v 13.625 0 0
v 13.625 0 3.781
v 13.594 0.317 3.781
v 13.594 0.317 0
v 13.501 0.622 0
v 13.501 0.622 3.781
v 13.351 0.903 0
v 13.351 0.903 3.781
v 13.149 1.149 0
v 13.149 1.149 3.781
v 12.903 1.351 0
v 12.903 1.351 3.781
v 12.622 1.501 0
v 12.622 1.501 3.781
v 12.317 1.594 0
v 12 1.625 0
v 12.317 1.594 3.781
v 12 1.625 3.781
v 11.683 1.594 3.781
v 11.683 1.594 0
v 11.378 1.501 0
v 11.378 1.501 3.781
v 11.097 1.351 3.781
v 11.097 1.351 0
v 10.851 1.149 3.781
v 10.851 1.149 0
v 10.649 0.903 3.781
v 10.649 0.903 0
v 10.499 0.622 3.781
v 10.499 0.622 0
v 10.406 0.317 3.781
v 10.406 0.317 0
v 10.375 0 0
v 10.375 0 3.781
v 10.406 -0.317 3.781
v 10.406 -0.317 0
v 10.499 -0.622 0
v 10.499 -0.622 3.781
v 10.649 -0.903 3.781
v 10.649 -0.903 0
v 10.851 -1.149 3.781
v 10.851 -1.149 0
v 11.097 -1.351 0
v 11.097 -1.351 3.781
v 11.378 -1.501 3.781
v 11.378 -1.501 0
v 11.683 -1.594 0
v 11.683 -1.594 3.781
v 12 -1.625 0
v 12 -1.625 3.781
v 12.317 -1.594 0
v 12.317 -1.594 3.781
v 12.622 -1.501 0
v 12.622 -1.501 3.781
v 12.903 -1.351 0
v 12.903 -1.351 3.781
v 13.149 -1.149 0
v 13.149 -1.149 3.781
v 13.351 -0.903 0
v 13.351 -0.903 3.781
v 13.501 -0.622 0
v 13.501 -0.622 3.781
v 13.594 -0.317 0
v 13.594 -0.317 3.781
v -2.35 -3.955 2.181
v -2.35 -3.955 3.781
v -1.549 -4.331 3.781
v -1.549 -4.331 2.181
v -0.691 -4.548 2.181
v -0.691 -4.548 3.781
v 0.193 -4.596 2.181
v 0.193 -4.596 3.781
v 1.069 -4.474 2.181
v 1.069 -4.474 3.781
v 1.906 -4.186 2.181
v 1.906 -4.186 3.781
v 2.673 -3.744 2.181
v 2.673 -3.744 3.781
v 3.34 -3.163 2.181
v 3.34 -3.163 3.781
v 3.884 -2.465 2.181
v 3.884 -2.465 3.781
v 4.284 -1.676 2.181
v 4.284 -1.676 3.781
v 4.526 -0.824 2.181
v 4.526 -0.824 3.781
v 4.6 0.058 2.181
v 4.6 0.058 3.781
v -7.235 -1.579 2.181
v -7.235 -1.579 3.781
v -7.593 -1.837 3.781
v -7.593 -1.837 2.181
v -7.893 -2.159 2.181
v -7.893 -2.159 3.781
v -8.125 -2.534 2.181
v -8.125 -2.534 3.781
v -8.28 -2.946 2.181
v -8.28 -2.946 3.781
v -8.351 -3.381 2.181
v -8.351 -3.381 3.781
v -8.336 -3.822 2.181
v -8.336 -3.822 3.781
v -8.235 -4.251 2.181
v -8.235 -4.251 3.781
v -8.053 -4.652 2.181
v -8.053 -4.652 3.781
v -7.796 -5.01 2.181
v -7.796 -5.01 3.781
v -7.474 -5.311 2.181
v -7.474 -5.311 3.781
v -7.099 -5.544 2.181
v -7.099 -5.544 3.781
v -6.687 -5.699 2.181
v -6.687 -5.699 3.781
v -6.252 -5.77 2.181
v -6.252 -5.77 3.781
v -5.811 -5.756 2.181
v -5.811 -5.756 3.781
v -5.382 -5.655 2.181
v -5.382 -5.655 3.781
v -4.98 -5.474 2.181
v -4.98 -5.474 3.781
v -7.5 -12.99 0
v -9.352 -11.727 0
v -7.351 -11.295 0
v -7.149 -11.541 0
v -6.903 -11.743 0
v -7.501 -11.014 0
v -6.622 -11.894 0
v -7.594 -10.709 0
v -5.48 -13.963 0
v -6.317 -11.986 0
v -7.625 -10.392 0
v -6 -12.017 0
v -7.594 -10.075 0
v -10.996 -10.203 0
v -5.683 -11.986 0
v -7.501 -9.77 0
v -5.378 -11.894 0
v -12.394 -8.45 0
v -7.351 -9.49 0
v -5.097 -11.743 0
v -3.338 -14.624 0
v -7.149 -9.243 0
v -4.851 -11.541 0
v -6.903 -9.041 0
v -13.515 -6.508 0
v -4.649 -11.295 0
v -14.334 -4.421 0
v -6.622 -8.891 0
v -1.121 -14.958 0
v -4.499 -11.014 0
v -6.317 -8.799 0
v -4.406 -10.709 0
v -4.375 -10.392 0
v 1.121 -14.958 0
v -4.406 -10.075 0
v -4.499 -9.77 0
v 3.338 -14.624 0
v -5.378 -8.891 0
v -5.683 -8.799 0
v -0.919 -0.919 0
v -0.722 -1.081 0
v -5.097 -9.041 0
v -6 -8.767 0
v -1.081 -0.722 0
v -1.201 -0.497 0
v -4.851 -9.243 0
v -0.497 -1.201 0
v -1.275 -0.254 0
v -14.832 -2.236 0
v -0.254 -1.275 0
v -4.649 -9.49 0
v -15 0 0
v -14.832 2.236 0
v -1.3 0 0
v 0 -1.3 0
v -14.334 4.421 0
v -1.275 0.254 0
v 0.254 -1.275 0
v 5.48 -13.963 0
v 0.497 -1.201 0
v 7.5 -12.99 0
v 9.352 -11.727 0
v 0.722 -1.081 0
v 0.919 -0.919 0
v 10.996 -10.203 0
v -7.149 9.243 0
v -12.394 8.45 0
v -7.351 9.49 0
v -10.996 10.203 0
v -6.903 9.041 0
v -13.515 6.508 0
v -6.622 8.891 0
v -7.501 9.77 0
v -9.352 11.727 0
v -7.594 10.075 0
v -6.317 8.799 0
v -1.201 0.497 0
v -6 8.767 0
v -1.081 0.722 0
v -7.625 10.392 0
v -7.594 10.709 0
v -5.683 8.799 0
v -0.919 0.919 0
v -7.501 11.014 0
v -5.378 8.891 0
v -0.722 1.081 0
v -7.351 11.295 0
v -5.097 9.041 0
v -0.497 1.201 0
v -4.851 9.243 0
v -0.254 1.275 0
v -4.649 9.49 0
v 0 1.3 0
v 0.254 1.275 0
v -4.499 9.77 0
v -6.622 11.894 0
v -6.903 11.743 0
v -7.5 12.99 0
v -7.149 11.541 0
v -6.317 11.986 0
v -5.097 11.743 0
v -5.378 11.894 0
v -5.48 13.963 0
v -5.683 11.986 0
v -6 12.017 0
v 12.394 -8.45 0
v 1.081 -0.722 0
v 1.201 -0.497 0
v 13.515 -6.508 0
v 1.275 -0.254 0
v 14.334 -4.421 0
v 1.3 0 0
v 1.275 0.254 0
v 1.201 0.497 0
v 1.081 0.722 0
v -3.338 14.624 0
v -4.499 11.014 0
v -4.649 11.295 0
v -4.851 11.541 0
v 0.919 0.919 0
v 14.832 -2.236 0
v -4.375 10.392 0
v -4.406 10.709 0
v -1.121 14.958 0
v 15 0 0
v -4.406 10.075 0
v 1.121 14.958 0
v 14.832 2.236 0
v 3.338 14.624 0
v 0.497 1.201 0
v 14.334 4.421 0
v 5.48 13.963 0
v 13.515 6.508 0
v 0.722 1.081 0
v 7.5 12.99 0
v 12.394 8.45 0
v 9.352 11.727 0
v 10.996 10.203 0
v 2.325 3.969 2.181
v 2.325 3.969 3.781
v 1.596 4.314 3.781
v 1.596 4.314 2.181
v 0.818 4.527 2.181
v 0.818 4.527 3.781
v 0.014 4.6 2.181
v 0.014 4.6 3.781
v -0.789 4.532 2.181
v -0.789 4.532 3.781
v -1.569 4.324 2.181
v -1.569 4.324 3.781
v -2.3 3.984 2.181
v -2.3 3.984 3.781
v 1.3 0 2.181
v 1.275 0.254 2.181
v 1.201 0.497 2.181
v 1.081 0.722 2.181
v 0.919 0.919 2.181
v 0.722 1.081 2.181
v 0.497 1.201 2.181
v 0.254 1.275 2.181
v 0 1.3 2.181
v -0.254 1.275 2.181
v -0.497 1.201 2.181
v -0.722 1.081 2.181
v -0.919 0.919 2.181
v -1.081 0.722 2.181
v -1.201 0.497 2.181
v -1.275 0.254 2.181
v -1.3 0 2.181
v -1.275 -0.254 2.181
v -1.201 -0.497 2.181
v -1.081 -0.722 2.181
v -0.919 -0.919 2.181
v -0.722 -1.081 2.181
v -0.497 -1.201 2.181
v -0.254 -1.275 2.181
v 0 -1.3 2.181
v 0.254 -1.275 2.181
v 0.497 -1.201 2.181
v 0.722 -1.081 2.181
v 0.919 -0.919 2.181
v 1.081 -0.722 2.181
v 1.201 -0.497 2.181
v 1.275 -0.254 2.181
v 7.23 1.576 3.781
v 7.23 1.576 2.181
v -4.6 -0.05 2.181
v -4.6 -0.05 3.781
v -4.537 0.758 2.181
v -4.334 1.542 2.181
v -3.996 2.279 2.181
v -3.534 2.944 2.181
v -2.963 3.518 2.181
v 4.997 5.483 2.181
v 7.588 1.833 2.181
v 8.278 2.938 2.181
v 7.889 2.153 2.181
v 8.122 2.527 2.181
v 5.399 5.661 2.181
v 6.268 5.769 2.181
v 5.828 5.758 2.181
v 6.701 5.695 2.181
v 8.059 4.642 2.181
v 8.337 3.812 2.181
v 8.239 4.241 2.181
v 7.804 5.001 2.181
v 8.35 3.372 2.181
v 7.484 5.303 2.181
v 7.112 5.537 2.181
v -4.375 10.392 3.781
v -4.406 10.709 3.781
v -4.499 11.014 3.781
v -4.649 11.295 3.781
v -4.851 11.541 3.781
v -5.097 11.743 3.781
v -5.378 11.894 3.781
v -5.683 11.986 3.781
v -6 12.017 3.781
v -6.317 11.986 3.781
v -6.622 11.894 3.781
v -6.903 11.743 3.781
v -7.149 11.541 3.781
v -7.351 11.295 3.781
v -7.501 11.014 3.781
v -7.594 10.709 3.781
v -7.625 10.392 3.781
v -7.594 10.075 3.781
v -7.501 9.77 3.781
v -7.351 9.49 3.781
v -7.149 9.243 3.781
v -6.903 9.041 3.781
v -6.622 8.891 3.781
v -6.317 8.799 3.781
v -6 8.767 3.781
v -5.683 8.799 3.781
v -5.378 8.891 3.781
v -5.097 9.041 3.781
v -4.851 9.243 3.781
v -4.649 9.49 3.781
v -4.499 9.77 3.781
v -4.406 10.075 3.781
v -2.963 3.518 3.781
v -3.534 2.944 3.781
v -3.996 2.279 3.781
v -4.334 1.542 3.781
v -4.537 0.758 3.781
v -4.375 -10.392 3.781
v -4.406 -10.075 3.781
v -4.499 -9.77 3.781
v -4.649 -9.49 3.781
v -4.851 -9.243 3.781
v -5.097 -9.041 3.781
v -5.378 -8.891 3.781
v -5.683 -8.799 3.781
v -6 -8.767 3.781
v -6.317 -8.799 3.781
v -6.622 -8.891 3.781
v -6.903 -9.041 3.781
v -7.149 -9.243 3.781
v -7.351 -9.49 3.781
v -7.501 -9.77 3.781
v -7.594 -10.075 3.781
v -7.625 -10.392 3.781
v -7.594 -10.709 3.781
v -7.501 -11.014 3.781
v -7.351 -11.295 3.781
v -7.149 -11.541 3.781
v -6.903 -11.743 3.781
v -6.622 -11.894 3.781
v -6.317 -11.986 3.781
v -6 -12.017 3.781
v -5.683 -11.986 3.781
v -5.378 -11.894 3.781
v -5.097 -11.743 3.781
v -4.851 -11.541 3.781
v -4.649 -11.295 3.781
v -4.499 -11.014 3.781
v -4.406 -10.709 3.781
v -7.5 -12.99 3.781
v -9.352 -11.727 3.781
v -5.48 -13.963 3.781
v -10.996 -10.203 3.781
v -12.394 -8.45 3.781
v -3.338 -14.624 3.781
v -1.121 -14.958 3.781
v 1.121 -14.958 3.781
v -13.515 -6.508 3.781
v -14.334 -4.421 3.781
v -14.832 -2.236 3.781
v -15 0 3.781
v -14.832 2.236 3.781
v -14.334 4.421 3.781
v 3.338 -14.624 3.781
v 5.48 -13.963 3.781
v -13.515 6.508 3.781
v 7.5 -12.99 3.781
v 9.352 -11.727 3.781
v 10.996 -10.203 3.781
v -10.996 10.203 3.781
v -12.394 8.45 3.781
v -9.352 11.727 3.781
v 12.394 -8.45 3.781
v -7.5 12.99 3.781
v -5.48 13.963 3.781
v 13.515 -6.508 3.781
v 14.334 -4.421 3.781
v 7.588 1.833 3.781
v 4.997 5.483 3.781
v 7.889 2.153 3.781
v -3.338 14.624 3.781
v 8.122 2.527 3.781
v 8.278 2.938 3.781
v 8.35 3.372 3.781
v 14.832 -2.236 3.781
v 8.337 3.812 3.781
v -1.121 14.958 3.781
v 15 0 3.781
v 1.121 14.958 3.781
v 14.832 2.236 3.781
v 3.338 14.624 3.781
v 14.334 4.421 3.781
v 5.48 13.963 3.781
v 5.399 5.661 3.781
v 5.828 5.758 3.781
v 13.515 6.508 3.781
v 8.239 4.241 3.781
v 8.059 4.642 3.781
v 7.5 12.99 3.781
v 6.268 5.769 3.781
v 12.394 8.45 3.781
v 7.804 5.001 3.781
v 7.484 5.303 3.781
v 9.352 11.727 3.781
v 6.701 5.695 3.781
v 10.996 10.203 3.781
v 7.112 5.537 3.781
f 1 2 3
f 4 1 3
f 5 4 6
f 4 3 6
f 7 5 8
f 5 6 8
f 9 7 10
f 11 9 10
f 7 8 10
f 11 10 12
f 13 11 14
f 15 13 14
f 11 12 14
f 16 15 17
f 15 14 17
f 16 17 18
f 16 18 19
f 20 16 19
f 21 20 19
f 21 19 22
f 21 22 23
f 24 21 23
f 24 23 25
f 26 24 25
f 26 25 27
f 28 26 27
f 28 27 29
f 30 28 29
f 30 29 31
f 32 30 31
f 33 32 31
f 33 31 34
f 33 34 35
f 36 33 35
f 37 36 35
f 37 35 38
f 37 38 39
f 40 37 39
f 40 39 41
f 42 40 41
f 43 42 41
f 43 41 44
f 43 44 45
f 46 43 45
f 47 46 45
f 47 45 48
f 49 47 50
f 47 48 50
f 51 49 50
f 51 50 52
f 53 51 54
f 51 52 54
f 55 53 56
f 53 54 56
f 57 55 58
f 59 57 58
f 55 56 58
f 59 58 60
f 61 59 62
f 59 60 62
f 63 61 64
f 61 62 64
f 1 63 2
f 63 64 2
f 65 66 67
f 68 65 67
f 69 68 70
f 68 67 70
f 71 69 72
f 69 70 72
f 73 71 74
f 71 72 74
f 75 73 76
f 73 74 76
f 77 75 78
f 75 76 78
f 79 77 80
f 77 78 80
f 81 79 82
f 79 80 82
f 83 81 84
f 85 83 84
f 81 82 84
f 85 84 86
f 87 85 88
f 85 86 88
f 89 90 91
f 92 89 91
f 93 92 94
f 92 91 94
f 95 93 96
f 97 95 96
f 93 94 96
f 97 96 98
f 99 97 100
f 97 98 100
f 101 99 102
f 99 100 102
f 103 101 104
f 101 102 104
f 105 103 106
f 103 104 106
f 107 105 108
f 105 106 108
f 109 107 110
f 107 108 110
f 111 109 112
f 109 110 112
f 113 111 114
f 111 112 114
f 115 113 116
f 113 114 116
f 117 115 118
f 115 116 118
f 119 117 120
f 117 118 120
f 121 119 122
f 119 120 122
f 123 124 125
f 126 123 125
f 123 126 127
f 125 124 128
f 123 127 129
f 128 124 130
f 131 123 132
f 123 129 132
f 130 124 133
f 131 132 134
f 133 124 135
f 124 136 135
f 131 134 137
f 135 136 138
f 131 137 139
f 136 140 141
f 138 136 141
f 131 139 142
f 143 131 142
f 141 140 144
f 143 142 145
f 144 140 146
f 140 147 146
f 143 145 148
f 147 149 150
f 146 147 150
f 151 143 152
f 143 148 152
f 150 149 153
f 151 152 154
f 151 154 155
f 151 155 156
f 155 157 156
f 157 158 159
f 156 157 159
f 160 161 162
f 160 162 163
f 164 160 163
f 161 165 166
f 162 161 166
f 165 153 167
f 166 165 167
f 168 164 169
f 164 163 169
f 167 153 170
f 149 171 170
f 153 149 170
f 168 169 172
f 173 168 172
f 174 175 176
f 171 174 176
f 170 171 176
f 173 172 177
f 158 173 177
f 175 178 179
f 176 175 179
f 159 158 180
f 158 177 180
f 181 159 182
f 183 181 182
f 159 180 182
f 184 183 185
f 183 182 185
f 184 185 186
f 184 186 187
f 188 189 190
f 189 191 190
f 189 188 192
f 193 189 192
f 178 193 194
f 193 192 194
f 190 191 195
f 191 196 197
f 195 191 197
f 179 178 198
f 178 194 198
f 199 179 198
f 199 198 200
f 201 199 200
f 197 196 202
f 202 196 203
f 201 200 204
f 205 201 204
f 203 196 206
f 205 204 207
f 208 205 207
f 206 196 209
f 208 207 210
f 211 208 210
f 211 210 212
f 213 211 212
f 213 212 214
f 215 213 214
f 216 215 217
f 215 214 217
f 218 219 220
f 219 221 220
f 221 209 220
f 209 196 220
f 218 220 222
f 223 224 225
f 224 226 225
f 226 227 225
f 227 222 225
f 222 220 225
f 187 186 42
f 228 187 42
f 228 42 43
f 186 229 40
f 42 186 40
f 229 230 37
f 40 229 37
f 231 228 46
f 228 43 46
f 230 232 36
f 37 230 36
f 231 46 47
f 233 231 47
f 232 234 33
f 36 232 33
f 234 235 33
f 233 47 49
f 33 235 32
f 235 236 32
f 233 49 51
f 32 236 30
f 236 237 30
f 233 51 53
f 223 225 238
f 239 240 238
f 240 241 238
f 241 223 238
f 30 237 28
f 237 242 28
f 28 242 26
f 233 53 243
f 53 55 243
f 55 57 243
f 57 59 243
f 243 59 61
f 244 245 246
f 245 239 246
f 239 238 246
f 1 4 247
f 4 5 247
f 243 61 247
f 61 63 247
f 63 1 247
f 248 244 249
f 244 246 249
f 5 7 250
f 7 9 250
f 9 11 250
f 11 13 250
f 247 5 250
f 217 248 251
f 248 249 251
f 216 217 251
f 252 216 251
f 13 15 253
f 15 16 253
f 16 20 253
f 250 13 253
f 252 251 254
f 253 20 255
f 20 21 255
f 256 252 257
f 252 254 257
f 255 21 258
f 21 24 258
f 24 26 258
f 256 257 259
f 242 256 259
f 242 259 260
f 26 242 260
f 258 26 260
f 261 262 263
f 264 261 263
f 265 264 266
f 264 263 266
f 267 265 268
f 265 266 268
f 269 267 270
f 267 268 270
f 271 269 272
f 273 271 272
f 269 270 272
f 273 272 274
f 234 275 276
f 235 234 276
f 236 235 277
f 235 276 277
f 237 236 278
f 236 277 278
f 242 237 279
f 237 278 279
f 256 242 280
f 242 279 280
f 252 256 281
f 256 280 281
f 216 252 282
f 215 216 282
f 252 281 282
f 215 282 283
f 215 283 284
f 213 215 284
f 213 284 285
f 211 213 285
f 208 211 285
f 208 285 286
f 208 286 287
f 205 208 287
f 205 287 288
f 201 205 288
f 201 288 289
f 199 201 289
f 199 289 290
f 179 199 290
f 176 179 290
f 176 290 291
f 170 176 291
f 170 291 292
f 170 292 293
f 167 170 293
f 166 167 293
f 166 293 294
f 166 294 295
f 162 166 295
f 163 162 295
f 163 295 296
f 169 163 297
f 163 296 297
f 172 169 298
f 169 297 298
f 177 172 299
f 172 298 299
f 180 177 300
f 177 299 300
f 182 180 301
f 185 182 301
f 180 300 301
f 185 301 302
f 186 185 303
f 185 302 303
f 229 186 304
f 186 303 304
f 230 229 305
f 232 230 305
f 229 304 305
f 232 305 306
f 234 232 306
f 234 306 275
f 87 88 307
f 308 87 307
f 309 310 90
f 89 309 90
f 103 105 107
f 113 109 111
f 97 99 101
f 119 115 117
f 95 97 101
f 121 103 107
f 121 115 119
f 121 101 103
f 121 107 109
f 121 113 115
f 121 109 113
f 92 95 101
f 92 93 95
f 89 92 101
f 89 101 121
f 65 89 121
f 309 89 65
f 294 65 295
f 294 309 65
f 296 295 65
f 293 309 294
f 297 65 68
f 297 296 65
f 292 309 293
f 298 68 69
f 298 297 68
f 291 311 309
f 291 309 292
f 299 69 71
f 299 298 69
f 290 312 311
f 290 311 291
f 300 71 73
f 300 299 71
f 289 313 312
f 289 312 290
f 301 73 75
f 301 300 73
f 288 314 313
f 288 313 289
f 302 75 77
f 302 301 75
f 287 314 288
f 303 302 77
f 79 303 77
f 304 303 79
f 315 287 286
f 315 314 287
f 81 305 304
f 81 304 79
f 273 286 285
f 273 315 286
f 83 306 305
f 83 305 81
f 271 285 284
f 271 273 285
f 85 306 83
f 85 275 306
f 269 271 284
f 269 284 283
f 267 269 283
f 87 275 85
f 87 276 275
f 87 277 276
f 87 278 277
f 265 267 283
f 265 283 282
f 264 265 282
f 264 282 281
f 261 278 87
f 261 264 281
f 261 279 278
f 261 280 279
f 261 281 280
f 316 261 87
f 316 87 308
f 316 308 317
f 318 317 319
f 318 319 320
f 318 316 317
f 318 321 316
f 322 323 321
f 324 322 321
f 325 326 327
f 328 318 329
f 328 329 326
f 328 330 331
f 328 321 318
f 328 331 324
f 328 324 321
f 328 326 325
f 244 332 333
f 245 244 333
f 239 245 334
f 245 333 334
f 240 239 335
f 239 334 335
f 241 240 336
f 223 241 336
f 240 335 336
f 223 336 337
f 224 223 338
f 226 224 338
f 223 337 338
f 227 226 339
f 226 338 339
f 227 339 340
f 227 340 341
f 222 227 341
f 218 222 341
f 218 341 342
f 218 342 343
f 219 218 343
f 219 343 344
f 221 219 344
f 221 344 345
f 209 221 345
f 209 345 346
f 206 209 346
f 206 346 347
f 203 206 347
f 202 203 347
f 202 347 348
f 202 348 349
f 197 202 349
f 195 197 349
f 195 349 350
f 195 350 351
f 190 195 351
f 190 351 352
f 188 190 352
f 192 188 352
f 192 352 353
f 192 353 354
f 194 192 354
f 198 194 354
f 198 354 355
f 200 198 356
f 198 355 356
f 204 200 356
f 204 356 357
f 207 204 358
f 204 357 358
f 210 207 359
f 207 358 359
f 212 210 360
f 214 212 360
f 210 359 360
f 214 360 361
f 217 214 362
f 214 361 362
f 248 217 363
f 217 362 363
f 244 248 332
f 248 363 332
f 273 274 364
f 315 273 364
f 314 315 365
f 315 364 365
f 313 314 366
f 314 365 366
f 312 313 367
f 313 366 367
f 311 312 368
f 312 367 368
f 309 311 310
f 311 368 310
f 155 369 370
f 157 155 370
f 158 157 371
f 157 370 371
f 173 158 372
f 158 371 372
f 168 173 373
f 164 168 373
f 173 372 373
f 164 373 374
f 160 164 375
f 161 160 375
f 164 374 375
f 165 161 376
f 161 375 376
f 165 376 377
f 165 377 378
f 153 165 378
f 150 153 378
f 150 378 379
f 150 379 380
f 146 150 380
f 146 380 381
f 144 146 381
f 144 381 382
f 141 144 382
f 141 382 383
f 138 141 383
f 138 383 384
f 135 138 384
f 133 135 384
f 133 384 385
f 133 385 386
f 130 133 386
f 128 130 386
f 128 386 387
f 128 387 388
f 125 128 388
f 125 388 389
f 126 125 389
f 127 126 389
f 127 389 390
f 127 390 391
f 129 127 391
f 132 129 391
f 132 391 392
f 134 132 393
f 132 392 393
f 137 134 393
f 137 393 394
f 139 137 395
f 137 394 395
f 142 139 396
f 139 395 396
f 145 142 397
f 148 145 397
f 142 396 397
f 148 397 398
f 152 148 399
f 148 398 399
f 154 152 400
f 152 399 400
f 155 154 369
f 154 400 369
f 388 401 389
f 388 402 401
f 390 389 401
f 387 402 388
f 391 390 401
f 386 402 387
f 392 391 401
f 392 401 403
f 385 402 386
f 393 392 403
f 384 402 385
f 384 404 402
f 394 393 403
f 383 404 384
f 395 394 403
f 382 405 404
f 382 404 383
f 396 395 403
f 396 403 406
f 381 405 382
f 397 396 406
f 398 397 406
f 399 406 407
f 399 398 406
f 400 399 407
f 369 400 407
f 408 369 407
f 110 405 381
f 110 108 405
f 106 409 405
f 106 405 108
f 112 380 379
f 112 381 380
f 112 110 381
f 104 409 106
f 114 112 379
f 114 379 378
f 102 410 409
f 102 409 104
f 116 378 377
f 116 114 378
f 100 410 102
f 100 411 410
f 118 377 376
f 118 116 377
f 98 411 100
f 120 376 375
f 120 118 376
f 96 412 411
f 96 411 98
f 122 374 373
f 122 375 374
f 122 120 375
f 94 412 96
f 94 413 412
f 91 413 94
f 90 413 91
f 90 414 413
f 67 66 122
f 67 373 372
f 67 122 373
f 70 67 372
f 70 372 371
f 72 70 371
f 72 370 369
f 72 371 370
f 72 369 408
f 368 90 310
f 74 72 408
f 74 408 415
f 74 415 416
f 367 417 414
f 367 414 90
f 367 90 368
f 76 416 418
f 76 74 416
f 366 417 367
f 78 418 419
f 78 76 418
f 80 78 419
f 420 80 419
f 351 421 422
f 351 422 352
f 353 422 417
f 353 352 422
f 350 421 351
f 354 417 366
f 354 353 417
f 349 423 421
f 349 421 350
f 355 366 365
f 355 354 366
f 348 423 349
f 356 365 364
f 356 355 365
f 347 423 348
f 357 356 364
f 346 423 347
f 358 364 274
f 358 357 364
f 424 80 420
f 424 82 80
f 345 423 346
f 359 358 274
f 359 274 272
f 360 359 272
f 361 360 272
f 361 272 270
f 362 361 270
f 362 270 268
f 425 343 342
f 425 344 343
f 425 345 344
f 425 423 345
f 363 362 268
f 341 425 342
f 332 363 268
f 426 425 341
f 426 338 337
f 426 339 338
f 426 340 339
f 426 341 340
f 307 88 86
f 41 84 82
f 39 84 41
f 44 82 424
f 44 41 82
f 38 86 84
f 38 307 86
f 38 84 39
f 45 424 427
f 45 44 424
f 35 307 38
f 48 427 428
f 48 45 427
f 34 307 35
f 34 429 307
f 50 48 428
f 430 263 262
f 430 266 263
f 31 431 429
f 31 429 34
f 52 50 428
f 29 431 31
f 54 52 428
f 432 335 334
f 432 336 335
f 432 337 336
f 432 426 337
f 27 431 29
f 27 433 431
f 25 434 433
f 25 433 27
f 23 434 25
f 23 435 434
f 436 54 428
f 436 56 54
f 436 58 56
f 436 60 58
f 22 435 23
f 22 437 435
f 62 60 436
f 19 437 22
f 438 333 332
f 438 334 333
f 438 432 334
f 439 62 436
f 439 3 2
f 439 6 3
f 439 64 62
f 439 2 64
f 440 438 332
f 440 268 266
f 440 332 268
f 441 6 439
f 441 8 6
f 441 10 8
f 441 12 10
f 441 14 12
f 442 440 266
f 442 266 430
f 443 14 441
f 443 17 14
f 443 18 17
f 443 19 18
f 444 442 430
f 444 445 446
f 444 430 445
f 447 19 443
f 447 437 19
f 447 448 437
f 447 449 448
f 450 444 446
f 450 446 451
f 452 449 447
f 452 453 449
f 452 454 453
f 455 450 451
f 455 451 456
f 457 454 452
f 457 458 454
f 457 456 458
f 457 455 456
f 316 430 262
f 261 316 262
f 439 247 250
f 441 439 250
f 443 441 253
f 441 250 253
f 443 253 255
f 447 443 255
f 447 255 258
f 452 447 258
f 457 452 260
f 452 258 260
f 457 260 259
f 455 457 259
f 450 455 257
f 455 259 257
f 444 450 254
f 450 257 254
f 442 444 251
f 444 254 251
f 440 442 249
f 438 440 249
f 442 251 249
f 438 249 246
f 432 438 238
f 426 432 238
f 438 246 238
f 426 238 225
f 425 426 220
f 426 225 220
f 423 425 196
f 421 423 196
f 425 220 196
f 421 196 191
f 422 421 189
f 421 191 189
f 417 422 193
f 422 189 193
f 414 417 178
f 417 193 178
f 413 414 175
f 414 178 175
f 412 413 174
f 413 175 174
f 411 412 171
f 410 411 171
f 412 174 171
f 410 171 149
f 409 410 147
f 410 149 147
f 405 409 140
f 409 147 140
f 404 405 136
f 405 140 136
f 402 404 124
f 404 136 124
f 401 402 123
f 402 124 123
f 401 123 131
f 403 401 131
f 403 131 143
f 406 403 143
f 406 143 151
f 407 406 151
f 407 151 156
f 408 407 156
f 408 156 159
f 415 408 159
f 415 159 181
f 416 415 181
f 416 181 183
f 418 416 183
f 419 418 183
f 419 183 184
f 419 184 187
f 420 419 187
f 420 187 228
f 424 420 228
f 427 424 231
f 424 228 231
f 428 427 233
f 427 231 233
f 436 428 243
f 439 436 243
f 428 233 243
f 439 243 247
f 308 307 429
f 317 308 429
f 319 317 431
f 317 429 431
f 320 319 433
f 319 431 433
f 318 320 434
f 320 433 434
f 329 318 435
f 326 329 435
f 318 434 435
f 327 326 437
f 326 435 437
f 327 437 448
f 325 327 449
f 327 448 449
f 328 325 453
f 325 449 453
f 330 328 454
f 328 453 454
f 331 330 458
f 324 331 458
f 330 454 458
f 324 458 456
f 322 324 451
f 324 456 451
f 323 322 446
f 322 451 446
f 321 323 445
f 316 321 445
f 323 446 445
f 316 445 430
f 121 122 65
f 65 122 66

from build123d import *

# Parameters (mm, degrees)
SCHIZZO1_R                   = 15
ESTRUSIONE_ESTRUSIONE1_DEPTH = 3.781092502
SCHIZZO2_R                   = 1.625
SCHIZZO2_R_2                 = 1.3
TAGLIO_ESTRUSIONE1_DEPTH     = 4.781092502
SCHIZZO3_R                   = 1.3
TAGLIO_ESTRUSIONE2_DEPTH     = 1.6


with BuildPart() as part:
    # Schizzo1 → Estrusione-Estrusione1 (new body)
    with BuildSketch(Plane.XY):
        Circle(SCHIZZO1_R)
    extrude(amount=ESTRUSIONE_ESTRUSIONE1_DEPTH)

    # Schizzo2 → Taglio-Estrusione1 (cut, through all)
    with BuildSketch(Plane.XY.offset(3.781092502)):
        with Locations((12, 0)):
            Circle(SCHIZZO2_R)
        with Locations((-6, 10.392304845)):
            Circle(SCHIZZO2_R)
        with Locations((-6, -10.392304845)):
            Circle(SCHIZZO2_R)
        Circle(SCHIZZO2_R_2)
    extrude(amount=-TAGLIO_ESTRUSIONE1_DEPTH, mode=Mode.SUBTRACT)

    # Schizzo3 → Taglio-Estrusione2 (cut)
    with BuildSketch(Plane.XY.offset(3.781092502)):
        with BuildLine():
            Line((2.324693054, 3.969357908), (-7.234922947, -1.579015265))
            ThreePointArc((-7.234922947, -1.579015265), (-8.052751546, -4.652222254), (-4.980479907, -5.473557626))
            Line((-4.980479907, -5.473557626), (7.230479097, 1.576442841))
            ThreePointArc((7.230479097, 1.576442841), (8.058653282, 4.641964906), (4.996568233, 5.482758079))
            Line((4.996568233, 5.482758079), (2.324693054, 3.969357908))
        make_face()
        Circle(SCHIZZO3_R, mode=Mode.SUBTRACT)
        with BuildLine():
            Line((-4.599733028, -0.049558742), (-1.133047311, 1.962495511))
            Line((-1.133047311, 1.962495511), (-2.3, 3.983716857))
            ThreePointArc((-2.3, 3.983716857), (-3.996048921, 2.278506752), (-4.599733028, -0.049558742))
        make_face()
        with BuildLine():
            Line((-2.3, 3.983716857), (-1.133047311, 1.962495511))
            Line((-1.133047311, 1.962495511), (2.324693054, 3.969357908))
            ThreePointArc((2.324693054, 3.969357908), (0.014282212, 4.599977828), (-2.3, 3.983716857))
        make_face()
        with BuildLine():
            ThreePointArc((-2.349640269, -3.954641653), (2.3, -3.983716857), (4.599640269, 0.057527336))
            Line((4.599640269, 0.057527336), (-2.349640269, -3.954641653))
        make_face()
    extrude(amount=-TAGLIO_ESTRUSIONE2_DEPTH, mode=Mode.SUBTRACT)


solid = part.part
